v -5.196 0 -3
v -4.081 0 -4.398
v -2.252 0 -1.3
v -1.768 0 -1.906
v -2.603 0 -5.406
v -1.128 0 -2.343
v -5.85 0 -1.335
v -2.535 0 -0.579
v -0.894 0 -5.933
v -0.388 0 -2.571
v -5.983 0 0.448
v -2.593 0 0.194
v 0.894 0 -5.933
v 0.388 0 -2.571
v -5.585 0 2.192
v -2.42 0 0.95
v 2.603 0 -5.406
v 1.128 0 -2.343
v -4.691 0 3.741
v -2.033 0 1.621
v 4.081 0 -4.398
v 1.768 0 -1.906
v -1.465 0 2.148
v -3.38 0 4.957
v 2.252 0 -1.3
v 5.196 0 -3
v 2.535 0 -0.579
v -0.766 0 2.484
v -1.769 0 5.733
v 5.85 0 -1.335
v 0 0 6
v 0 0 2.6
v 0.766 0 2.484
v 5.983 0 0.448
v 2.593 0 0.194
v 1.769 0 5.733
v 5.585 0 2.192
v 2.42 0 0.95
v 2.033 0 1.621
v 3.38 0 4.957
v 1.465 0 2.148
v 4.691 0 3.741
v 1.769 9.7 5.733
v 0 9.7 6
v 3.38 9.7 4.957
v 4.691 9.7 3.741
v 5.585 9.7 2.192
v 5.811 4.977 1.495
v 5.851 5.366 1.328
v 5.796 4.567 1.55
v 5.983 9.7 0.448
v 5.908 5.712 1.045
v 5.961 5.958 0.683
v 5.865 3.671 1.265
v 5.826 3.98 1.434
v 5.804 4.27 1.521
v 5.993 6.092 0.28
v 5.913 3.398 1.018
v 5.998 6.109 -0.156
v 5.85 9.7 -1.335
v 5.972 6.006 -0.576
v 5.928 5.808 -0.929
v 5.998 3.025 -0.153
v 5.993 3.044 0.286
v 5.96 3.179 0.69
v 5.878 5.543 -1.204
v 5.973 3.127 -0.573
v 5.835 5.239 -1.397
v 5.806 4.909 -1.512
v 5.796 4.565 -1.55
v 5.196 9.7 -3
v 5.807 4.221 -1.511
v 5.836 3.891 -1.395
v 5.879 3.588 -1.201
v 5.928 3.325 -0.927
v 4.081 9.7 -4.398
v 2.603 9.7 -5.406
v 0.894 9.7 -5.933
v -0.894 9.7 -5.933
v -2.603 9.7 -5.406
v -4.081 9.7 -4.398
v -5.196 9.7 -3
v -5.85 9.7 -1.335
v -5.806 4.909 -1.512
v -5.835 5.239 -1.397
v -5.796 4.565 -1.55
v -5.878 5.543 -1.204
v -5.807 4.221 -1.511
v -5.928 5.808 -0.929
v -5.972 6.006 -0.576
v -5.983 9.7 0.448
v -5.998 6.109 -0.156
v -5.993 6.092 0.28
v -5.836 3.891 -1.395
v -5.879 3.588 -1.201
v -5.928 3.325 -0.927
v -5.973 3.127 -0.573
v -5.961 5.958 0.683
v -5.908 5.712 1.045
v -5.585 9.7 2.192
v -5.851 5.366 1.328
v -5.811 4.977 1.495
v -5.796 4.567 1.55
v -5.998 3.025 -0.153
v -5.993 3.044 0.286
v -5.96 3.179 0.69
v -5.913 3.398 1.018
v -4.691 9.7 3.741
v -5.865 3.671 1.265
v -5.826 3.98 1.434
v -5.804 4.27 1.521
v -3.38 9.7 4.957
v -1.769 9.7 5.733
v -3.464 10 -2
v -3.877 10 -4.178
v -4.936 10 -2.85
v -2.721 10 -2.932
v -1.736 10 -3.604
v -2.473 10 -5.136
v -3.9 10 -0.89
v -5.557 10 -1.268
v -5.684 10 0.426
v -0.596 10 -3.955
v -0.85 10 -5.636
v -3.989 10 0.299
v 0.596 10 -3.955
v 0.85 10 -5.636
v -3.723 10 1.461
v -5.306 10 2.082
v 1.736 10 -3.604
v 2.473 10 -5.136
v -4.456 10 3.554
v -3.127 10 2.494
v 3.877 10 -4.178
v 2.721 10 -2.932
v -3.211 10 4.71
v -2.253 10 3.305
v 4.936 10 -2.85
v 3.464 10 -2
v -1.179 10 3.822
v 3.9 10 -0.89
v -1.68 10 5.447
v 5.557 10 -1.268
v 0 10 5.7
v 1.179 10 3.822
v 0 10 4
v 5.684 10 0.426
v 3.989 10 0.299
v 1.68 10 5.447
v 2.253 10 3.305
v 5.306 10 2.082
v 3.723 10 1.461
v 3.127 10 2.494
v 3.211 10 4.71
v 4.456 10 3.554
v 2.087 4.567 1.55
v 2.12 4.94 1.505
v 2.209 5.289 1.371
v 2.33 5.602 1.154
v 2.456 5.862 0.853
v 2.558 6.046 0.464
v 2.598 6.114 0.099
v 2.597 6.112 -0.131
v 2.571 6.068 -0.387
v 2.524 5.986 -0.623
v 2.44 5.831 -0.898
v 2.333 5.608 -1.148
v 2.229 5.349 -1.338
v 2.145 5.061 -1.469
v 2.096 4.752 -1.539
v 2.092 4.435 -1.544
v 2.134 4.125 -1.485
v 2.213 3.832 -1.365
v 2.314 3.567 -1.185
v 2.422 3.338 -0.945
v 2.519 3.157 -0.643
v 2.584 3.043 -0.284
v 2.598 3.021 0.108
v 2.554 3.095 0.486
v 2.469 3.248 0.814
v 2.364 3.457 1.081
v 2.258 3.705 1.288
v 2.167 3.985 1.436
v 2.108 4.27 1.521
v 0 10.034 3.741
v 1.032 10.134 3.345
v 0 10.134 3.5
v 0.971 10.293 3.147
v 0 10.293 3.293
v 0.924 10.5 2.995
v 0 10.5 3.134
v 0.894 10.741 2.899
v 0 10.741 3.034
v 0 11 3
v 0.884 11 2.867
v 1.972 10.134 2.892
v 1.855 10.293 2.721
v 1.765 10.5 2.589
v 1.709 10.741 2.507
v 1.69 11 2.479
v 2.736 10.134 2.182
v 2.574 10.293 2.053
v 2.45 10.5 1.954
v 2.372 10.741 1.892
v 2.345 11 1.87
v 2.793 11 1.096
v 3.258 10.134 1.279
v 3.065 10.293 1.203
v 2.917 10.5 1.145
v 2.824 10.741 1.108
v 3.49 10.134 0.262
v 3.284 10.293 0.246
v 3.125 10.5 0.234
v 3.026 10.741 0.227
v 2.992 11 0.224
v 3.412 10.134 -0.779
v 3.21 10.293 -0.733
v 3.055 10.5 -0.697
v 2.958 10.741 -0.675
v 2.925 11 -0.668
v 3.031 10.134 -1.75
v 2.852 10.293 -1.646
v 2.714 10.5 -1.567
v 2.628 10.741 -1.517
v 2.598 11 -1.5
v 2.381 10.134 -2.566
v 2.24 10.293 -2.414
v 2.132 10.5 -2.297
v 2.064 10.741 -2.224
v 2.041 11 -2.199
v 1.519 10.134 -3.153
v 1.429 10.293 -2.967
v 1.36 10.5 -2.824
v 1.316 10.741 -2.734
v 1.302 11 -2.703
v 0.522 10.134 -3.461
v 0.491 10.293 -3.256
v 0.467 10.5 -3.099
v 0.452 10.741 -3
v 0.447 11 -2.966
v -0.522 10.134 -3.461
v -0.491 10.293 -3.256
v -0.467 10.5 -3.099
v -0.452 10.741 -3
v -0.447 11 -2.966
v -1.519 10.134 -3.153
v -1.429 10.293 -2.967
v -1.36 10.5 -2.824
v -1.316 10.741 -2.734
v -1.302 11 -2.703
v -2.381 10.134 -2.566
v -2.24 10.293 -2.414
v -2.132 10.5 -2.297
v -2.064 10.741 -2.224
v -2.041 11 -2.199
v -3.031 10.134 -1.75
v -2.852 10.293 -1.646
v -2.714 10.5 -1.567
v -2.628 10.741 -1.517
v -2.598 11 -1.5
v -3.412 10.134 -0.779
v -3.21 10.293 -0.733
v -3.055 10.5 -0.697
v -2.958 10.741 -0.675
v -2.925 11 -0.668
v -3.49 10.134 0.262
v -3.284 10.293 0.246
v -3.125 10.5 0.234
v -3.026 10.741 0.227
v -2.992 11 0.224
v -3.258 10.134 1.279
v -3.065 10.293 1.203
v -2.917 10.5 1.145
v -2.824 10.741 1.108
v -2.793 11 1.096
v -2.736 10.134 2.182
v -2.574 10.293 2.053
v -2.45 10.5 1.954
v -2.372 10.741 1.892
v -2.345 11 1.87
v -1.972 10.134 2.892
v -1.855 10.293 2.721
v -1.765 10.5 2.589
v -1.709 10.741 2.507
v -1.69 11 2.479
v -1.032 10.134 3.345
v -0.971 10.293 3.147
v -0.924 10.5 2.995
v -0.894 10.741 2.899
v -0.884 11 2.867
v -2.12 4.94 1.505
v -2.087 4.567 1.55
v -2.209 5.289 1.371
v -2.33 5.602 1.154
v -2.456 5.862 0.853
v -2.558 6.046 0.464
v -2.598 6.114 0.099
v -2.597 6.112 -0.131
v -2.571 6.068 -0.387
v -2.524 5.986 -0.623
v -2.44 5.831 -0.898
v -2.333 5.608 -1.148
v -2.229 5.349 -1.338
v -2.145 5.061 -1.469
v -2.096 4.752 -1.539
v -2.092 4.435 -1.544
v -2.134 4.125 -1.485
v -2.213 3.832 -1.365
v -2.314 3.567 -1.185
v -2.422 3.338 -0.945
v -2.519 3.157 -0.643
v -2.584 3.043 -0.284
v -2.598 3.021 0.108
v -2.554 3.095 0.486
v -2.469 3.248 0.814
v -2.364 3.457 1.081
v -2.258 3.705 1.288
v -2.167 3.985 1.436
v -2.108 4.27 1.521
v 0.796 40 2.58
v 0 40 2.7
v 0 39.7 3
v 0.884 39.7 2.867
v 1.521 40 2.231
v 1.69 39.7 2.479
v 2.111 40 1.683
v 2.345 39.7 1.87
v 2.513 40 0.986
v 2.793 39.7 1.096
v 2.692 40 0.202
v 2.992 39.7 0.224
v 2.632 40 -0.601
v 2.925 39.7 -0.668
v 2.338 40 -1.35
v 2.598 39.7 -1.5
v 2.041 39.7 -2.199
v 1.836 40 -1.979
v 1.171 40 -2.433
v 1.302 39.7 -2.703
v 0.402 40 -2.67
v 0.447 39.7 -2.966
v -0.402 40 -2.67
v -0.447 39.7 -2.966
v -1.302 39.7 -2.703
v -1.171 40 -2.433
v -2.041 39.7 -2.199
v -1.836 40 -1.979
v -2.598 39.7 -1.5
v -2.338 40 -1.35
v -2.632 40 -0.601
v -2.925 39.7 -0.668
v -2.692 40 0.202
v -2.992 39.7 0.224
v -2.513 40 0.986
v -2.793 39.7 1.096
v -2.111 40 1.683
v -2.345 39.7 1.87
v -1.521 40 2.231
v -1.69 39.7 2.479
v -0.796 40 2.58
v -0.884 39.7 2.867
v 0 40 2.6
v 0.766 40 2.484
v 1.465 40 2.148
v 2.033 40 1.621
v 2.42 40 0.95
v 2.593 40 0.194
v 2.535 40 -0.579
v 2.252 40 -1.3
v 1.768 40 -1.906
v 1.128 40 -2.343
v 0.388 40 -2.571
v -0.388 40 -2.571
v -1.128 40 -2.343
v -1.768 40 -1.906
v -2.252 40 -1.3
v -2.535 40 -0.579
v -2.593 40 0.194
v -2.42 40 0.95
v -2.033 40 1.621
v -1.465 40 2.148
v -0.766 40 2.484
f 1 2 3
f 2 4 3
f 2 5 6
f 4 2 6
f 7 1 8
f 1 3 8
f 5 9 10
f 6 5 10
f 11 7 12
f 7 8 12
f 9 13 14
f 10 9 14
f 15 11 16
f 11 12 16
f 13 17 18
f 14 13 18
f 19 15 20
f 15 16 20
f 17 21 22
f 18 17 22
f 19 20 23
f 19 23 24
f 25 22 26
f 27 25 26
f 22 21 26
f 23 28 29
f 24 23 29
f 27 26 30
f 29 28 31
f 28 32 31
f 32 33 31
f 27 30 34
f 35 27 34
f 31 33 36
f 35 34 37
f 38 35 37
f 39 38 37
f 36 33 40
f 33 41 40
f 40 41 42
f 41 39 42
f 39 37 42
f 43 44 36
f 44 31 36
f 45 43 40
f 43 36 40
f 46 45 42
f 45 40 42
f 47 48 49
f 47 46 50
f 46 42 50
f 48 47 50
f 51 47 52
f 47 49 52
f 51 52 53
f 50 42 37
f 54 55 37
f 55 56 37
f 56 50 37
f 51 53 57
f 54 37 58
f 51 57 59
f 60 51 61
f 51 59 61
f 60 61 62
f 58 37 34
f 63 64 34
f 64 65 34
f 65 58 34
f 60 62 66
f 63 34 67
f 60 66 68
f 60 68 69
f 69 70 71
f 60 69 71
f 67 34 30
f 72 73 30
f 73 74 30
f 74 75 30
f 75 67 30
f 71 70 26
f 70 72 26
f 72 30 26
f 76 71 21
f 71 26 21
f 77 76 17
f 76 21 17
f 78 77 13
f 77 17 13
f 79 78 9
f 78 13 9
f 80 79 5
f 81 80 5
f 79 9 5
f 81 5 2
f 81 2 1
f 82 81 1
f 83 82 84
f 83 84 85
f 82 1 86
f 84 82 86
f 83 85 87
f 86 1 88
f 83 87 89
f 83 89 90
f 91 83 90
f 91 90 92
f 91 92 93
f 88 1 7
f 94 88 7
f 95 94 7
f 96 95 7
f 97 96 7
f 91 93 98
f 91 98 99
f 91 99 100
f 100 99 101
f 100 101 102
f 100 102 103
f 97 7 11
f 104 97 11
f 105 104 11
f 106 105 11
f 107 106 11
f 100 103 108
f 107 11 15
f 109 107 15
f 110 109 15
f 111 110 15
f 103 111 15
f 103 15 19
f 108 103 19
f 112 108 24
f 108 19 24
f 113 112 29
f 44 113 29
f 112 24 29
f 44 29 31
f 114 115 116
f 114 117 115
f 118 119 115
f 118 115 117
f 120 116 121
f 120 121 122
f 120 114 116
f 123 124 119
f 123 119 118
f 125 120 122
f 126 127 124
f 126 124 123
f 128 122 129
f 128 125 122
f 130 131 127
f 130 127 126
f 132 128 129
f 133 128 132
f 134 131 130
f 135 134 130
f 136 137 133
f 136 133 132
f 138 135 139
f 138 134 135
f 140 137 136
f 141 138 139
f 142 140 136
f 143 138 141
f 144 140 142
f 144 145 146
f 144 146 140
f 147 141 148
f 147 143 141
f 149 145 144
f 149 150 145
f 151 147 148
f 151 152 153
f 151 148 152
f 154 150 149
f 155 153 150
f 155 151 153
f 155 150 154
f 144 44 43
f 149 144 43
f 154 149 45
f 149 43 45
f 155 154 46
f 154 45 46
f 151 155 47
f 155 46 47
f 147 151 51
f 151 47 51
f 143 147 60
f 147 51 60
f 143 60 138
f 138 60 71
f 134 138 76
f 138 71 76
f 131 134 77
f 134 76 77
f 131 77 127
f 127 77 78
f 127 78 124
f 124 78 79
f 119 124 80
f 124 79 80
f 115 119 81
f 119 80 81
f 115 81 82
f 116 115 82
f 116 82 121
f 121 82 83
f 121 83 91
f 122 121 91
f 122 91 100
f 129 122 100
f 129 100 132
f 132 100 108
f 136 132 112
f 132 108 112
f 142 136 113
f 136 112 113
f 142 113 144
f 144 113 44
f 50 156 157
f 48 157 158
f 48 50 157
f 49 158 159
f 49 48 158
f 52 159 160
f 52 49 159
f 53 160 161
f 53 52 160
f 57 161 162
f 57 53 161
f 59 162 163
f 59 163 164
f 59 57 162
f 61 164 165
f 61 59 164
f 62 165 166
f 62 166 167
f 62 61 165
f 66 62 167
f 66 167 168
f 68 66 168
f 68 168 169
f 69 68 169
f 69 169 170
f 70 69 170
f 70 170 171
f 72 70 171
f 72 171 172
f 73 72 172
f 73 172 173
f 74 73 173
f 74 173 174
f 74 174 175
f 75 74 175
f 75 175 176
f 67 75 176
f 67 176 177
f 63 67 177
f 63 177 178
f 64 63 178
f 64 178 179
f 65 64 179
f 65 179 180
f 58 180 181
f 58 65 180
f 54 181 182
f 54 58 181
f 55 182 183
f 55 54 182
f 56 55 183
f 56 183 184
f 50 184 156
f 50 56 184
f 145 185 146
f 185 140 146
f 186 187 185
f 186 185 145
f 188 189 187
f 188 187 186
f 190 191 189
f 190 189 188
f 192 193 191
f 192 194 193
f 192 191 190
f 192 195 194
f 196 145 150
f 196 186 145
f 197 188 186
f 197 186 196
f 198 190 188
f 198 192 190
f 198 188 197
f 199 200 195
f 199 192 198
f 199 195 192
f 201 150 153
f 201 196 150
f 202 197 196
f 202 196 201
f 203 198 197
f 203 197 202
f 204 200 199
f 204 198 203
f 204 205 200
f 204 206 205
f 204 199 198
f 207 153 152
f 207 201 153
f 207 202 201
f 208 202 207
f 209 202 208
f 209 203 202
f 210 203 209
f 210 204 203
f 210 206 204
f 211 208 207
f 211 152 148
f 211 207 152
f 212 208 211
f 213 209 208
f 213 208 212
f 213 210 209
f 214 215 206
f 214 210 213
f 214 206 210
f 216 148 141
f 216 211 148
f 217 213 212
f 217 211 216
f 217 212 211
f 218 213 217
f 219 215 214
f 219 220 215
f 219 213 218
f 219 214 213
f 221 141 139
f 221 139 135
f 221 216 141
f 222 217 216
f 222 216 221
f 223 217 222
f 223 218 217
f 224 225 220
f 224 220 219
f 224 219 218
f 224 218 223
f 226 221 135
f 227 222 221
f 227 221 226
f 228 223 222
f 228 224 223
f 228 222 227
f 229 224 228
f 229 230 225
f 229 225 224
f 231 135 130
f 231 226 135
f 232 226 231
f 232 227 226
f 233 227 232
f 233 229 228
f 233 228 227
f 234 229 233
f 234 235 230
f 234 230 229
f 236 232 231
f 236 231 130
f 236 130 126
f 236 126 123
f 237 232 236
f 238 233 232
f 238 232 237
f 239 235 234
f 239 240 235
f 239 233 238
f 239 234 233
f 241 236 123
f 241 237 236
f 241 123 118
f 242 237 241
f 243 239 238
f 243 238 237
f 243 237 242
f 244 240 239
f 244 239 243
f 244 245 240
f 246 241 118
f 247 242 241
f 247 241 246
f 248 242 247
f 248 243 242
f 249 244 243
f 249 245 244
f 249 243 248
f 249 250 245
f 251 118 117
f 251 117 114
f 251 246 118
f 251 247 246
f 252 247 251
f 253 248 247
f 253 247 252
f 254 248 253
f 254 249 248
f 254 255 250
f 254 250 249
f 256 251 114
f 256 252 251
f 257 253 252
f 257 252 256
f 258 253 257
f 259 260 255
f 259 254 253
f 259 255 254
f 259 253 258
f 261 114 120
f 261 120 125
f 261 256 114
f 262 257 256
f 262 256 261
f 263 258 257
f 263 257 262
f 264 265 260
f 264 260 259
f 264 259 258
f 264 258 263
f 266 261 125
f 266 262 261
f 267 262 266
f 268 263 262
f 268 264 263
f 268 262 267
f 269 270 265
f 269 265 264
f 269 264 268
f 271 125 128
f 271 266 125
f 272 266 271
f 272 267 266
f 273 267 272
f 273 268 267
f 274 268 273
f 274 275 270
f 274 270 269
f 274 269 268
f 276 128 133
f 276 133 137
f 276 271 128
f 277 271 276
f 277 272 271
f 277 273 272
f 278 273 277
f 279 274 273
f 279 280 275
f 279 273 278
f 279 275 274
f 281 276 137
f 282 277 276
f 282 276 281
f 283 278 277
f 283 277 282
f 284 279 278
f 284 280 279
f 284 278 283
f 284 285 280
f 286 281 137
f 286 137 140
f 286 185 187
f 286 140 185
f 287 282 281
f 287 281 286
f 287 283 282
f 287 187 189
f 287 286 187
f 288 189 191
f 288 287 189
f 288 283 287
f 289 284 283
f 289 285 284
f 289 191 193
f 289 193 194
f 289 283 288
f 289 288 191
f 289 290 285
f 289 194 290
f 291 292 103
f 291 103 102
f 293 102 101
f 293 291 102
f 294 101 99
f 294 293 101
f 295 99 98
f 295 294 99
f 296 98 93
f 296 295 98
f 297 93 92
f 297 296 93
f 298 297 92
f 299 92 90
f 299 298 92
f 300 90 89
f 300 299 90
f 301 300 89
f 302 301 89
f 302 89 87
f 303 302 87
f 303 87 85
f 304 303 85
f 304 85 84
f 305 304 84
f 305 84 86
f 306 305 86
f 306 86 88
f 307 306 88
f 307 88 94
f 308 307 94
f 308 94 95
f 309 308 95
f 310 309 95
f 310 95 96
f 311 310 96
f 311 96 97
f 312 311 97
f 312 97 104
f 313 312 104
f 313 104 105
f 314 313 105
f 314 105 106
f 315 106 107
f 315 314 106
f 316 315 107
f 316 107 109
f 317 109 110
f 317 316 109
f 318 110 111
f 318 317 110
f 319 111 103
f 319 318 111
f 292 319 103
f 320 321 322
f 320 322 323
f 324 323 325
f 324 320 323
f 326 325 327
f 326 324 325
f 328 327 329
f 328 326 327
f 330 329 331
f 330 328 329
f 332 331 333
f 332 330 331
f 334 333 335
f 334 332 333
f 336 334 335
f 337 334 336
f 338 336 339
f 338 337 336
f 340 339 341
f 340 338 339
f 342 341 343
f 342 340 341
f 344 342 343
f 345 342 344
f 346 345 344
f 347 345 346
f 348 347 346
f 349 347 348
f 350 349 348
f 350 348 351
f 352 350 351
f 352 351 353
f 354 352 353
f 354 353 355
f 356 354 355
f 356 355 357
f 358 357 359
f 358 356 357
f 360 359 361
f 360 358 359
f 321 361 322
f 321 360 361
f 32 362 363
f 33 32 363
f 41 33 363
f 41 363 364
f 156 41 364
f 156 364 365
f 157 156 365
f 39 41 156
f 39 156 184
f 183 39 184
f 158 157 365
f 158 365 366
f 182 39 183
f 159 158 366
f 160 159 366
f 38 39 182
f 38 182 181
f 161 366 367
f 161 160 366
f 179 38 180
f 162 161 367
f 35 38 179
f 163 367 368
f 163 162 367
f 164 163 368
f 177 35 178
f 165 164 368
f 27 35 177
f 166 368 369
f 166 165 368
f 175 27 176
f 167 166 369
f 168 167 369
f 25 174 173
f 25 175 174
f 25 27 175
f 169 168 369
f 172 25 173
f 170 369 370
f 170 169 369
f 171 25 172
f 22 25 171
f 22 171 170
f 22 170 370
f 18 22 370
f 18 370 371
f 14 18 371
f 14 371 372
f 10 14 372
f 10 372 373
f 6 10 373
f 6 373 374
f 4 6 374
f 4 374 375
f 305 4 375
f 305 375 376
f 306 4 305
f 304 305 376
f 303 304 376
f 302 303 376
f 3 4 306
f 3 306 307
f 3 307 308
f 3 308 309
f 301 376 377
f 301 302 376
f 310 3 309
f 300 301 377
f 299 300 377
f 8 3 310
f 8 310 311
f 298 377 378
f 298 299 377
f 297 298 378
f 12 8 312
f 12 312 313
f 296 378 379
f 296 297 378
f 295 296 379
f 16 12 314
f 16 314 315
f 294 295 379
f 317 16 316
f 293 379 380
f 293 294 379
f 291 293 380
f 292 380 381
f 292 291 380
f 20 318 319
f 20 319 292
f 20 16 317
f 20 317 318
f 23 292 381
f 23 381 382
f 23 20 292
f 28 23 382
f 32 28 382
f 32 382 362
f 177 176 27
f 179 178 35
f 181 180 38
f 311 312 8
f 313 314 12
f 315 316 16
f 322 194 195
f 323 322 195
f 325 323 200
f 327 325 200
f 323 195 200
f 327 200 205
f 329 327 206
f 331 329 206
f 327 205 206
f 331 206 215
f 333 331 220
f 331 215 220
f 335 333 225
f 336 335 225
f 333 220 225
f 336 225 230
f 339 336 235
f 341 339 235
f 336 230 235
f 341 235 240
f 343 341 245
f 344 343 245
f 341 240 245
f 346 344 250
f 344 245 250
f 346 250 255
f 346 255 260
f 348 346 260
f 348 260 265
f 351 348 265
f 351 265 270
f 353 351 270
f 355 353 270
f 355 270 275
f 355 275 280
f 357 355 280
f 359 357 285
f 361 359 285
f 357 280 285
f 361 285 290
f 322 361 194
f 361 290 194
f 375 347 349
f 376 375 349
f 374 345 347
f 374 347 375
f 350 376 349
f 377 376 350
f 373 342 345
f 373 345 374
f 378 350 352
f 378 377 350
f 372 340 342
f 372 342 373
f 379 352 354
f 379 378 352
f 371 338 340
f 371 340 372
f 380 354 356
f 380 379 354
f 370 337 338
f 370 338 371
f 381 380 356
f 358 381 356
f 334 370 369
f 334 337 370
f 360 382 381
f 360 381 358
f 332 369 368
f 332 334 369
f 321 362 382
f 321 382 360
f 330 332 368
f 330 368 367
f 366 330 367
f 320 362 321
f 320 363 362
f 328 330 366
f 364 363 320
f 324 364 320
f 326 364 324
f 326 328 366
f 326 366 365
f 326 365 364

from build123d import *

# Parameters (mm, degrees)
SKETCH6_R               = 6
BOSS_EXTRUDE4_DEPTH     = 10
SKETCH7_R               = 3
BOSS_EXTRUDE5_DEPTH     = 30
CHAMFER1_SIZE           = 0.3
CHAMFER2_SIZE           = 0.3
CUT_EXTRUDE4_DEPTH      = 43.190046219
CUT_EXTRUDE4_DEPTH_BACK = 43.190046219
SKETCH10_R              = 1.55
CUT_EXTRUDE5_DEPTH      = 41.890096728
CUT_EXTRUDE5_DEPTH_BACK = 41.890096728
SKETCH11_R              = 2.6
FILLET1_R               = 1


with BuildPart() as part:
    # Sketch6 → Boss-Extrude4 (new body)
    with BuildSketch(Plane(origin=(0, 0, 0), x_dir=(1, 0, 0), z_dir=(0, 1, 0))):
        with Locations(Location((0, 0, 0), (0, 0, 270))):
            Circle(SKETCH6_R)
    extrude(amount=BOSS_EXTRUDE4_DEPTH)

    # Sketch7 → Boss-Extrude5 (add)
    with BuildSketch(Plane(origin=(0, 10, 0), x_dir=(1, 0, 0), z_dir=(0, 1, 0))):
        with Locations(Location((0, 0, 0), (0, 0, 270))):
            Circle(SKETCH7_R)
    extrude(amount=BOSS_EXTRUDE5_DEPTH)

    # Chamfer1
    chamfer1_edges = [part.edges().sort_by_distance(p)[0] for p in [
        (0, 40, -3),
    ]]
    chamfer(chamfer1_edges, length=CHAMFER1_SIZE)

    # Chamfer2
    chamfer2_edges = [part.edges().sort_by_distance(p)[0] for p in [
        (0, 10, -6),
    ]]
    chamfer(chamfer2_edges, length=CHAMFER2_SIZE)

    # Sketch10 → Cut-Extrude4 (cut, two sides: drawn at the far end of the back side and taken through both)
    with BuildSketch(Plane.ZY.offset(6).offset(-CUT_EXTRUDE4_DEPTH_BACK)):
        with Locations((0, 4.567060469)):
            Circle(SKETCH10_R)
    extrude(amount=CUT_EXTRUDE4_DEPTH + CUT_EXTRUDE4_DEPTH_BACK, mode=Mode.SUBTRACT)

    # Sketch11 → Cut-Extrude5 (cut, two sides: drawn at the far end of the back side and taken through both)
    with BuildSketch(Plane(origin=(0, 40, 0), x_dir=(1, 0, 0), z_dir=(0, 1, 0)).offset(-CUT_EXTRUDE5_DEPTH_BACK)):
        with Locations(Location((0, 0, 0), (0, 0, 270))):
            Circle(SKETCH11_R)
    extrude(amount=CUT_EXTRUDE5_DEPTH + CUT_EXTRUDE5_DEPTH_BACK, mode=Mode.SUBTRACT)

    # Fillet1
    fillet1_edges = [part.edges().sort_by_distance(p)[0] for p in [
        (0, 10, -3),
    ]]
    fillet(fillet1_edges, radius=FILLET1_R)


solid = part.part
